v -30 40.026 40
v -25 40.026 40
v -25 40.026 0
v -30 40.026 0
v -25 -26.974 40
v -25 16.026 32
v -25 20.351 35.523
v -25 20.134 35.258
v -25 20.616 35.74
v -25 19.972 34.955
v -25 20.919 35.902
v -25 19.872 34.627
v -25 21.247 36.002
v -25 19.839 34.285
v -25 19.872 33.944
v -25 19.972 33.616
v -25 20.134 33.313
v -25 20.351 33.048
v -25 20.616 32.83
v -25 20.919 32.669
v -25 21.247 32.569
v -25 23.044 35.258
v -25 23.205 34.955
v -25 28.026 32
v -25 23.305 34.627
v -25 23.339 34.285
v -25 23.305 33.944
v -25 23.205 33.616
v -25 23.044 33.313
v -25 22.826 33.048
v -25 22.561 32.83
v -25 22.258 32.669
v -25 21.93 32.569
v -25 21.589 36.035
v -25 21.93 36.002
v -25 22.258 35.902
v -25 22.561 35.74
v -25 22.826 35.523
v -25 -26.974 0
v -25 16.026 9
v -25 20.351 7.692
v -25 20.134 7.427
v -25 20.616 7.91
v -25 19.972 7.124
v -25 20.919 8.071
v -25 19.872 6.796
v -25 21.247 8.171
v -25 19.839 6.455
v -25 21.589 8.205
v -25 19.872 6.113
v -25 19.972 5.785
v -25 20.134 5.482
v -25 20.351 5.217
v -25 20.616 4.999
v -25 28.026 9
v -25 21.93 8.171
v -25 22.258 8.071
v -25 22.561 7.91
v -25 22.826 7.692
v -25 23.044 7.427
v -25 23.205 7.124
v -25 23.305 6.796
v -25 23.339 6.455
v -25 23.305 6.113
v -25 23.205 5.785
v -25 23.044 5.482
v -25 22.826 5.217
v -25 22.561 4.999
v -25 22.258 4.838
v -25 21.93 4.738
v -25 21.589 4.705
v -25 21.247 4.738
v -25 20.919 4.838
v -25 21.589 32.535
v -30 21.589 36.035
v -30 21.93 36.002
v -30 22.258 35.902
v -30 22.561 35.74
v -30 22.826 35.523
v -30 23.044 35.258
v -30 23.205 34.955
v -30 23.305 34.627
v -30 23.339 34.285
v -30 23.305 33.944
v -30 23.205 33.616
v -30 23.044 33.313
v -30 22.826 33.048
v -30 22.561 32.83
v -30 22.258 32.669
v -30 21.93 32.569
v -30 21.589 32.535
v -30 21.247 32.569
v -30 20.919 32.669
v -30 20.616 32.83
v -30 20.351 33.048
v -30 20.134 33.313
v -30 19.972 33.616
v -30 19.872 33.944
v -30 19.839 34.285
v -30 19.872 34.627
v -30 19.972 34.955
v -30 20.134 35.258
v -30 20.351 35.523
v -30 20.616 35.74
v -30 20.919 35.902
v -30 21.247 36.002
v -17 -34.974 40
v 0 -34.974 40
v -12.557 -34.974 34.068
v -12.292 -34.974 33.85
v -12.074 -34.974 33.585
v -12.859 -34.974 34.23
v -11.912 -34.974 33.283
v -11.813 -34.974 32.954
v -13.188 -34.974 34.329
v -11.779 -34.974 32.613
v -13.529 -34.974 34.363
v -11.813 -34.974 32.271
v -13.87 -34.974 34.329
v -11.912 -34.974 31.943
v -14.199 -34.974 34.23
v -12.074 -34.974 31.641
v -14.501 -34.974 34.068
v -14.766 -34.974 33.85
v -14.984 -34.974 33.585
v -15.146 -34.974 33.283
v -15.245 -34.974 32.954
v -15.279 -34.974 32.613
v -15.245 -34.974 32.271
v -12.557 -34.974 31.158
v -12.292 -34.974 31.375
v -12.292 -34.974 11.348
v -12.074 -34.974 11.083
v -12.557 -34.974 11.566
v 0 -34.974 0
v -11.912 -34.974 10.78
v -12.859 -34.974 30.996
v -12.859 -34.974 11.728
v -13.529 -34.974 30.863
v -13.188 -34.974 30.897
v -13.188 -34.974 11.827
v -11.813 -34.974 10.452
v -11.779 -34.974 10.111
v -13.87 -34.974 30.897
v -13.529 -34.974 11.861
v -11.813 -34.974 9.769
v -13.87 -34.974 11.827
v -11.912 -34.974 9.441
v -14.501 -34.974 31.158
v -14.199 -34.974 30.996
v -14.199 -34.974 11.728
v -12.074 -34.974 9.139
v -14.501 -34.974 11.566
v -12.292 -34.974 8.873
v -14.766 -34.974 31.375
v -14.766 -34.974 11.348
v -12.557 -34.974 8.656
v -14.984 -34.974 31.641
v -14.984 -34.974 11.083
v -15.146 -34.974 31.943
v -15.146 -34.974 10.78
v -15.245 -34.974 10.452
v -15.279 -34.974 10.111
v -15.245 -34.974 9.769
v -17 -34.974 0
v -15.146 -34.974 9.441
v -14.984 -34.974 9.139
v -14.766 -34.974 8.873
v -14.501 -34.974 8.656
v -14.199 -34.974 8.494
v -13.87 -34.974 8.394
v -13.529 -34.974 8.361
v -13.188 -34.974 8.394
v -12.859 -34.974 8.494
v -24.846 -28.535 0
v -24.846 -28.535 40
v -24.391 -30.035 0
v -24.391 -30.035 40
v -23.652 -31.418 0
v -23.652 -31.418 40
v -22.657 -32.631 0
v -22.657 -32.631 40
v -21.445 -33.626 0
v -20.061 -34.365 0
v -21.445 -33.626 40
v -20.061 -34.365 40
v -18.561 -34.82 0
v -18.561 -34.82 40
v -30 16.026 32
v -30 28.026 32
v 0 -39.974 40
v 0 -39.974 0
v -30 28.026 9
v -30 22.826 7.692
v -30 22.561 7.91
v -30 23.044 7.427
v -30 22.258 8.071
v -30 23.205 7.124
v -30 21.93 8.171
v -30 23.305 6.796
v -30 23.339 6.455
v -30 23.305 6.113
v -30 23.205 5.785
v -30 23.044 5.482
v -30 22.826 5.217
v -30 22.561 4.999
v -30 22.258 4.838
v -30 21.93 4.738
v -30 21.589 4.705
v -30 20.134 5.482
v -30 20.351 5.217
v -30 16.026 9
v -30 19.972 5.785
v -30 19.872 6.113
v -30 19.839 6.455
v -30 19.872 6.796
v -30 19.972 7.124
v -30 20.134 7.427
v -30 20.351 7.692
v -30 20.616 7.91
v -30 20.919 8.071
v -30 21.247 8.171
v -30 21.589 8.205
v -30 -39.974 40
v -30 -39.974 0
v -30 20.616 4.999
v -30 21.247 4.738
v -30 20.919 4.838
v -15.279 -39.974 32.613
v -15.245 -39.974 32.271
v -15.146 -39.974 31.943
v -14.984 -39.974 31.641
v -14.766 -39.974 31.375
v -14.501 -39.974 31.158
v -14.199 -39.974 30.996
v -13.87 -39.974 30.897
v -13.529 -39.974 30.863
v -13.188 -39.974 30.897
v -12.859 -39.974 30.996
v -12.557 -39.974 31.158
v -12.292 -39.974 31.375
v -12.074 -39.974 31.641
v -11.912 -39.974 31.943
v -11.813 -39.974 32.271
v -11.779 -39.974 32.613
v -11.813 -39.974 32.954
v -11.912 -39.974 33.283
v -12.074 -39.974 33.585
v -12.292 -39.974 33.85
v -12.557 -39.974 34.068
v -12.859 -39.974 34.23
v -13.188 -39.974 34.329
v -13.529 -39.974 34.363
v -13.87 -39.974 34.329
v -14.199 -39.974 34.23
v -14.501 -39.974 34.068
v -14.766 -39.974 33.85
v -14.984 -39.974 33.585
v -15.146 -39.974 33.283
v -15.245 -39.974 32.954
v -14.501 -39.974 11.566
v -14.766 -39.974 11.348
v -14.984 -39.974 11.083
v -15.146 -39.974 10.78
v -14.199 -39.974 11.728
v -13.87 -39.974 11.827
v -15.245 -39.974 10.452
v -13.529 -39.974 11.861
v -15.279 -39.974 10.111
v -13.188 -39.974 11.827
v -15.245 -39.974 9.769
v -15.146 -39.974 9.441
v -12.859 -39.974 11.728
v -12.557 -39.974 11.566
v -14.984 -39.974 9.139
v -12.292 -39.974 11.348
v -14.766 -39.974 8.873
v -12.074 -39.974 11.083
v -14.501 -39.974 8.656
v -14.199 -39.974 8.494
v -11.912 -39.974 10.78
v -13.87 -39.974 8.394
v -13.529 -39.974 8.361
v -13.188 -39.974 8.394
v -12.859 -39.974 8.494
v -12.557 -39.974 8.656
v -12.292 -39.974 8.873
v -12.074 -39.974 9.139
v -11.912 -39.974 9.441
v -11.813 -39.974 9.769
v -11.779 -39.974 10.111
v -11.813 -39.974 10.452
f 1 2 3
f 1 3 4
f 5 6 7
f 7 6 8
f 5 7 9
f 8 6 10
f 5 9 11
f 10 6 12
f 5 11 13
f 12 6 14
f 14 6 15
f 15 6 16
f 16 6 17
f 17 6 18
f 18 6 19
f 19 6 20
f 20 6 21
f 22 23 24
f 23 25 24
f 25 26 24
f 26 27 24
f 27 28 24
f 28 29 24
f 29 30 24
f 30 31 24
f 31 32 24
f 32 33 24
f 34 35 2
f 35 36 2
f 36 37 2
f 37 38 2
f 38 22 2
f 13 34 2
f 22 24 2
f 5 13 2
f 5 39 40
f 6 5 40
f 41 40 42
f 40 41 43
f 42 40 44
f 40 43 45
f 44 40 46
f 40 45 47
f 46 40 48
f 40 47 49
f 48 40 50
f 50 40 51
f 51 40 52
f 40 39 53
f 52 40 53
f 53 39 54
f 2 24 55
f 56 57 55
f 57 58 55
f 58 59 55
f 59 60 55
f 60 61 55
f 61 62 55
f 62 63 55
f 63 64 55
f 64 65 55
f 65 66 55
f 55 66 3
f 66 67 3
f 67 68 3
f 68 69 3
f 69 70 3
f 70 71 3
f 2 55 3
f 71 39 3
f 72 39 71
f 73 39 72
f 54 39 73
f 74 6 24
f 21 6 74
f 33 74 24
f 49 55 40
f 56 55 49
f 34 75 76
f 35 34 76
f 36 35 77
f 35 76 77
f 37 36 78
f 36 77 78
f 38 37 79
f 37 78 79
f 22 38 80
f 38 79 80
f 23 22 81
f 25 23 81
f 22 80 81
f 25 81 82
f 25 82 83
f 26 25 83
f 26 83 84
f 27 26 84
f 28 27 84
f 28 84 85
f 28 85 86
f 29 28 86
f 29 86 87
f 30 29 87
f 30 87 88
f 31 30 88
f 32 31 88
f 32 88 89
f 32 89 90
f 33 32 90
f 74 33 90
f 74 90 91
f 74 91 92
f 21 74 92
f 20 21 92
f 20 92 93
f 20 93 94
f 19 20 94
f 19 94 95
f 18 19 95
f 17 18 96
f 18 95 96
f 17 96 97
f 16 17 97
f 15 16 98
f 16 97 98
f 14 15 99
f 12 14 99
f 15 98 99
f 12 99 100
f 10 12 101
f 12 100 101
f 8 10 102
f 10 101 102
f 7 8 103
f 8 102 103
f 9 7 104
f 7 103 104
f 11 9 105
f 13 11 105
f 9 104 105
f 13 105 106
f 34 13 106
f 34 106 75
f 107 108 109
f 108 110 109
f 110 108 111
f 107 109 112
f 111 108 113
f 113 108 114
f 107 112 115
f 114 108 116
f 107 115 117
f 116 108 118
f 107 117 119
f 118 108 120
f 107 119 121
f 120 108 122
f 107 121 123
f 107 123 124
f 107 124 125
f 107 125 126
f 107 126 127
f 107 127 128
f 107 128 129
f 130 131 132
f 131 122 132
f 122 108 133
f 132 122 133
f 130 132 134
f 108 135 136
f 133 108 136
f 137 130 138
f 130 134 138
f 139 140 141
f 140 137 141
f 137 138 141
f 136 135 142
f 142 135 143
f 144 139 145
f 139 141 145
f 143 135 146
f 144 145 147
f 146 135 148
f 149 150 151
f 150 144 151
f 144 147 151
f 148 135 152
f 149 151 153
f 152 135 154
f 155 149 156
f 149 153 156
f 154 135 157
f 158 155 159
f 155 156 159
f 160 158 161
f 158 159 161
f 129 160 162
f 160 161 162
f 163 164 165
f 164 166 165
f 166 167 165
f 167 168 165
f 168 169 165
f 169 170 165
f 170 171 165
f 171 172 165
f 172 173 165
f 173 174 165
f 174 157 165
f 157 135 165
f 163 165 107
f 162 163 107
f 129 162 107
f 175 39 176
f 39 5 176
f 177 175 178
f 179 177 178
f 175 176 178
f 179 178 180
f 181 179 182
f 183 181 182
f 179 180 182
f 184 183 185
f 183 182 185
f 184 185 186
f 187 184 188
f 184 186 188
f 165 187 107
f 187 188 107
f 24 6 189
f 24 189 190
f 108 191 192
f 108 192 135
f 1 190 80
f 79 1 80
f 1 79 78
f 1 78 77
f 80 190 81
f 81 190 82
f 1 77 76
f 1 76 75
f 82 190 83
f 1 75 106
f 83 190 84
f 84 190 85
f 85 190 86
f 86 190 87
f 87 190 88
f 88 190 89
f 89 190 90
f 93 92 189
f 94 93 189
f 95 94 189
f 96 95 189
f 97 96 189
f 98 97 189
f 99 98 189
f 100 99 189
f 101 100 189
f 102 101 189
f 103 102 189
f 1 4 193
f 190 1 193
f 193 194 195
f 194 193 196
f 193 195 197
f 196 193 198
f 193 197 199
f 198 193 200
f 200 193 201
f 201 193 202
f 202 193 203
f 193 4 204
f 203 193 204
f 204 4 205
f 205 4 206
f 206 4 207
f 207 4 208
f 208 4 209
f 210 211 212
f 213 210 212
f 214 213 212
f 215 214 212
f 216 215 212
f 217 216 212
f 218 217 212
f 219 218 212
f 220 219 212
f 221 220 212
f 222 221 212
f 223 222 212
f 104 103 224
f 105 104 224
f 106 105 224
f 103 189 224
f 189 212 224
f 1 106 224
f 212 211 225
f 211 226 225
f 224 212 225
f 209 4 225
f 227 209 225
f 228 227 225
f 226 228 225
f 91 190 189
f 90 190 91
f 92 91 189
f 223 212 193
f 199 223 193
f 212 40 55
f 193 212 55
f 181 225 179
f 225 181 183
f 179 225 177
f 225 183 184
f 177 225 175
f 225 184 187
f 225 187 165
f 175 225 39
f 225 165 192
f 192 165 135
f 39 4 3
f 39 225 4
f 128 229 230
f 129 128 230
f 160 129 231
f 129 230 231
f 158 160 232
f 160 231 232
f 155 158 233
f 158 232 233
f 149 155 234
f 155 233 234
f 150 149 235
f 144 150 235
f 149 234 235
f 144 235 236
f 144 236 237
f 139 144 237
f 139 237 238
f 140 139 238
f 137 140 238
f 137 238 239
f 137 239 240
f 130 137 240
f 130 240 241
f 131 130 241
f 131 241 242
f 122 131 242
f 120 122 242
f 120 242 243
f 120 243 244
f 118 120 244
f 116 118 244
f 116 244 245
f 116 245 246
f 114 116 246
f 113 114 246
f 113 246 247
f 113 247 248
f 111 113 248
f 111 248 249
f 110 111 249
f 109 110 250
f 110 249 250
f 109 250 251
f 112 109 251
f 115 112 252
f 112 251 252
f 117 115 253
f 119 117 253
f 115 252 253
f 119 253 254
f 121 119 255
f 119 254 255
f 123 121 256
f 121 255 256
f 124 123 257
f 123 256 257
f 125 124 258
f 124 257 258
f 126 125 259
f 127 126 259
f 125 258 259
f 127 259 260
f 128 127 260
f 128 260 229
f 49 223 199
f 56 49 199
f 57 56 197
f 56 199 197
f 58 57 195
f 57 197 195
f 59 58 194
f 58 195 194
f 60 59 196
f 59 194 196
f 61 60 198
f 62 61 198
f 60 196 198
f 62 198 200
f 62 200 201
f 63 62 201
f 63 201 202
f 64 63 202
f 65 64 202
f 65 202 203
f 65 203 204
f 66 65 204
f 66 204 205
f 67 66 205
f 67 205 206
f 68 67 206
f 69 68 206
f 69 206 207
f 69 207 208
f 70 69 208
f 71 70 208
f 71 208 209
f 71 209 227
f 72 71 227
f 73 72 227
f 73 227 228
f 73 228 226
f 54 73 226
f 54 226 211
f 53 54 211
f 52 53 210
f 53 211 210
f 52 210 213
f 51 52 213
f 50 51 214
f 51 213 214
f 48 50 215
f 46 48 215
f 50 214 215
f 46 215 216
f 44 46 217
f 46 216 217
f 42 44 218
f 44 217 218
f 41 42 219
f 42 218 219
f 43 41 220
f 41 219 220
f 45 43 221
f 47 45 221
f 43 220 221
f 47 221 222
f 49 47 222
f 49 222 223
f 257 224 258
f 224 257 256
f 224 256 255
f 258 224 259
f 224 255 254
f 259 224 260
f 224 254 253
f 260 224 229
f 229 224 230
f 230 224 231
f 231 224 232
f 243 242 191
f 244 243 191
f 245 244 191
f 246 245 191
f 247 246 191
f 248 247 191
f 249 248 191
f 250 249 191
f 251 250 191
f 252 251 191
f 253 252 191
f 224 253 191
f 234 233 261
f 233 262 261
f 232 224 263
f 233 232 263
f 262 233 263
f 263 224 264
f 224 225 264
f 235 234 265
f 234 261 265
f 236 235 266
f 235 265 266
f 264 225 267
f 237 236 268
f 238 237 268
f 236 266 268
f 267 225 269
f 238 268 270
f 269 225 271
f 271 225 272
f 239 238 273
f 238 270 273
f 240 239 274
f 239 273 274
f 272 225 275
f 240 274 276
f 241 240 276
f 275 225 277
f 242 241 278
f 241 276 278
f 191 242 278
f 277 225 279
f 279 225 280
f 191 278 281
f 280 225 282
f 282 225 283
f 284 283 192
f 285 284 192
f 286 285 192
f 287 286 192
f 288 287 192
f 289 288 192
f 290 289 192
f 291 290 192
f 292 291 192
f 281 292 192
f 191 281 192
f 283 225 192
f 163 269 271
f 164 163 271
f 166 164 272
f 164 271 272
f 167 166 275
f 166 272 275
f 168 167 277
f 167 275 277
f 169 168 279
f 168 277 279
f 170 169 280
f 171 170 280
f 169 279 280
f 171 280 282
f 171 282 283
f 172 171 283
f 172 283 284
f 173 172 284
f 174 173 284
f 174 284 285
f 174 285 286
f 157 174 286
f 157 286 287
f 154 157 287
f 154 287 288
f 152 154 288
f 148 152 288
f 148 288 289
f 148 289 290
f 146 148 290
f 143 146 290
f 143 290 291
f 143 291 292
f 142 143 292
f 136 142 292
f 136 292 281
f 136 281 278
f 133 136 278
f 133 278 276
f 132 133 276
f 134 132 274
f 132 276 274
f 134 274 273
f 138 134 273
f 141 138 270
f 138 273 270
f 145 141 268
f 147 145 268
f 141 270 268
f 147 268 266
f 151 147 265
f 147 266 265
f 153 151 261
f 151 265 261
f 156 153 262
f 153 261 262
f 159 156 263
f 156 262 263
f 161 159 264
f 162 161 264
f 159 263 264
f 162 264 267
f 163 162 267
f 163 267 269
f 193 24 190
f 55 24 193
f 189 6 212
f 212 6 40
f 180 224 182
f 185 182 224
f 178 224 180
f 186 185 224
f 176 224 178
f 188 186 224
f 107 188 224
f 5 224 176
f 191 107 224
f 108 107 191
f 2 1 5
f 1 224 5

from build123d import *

# Parameters (mm, degrees)
RESSALTO_EXTRUS_O1_DEPTH                   = 40
BROCA_DE_ROSQUEAR_PARA_HELICOIDE_M31_D     = 3.5
BROCA_DE_ROSQUEAR_PARA_HELICOIDE_M31_DEPTH = 10
BROCA_DE_ROSQUEAR_PARA_HELICOIDE_M31_TIP   = 1.051506083
FILETE1_R                                  = 8
ESBO_O6_W                                  = 23
ESBO_O6_H                                  = 12
CORTE_EXTRUS_O1_DEPTH                      = 10
BROCA_DE_ROSQUEAR_PARA_HELICOIDE_M33_D     = 3.5
BROCA_DE_ROSQUEAR_PARA_HELICOIDE_M33_DEPTH = 10
BROCA_DE_ROSQUEAR_PARA_HELICOIDE_M33_TIP   = 1.051506083


with BuildPart() as part:
    # Esboço1 → Ressalto-extrusão1 (new body)
    with BuildSketch(Plane.XY):
        Polygon((-30, 40.02617801), (-30, -39.97382199), (0, -39.97382199), (0, -34.97382199), (-25, -34.97382199), (-25, 40.02617801), align=None)
    extrude(amount=RESSALTO_EXTRUS_O1_DEPTH)

    # Broca de rosquear para helicoide M31
    with Locations(Plane(origin=(0, -34.97382199, 0), x_dir=(1, 0, 0), z_dir=(0, 1, 0))):
        with Locations((-13.529029312, -32.612904954), (-13.529029312, -10.11076891)):
            Hole(BROCA_DE_ROSQUEAR_PARA_HELICOIDE_M31_D / 2, depth=BROCA_DE_ROSQUEAR_PARA_HELICOIDE_M31_DEPTH)
            with Locations((0, 0, -(BROCA_DE_ROSQUEAR_PARA_HELICOIDE_M31_DEPTH + BROCA_DE_ROSQUEAR_PARA_HELICOIDE_M31_TIP / 2))):  # 118° drill point
                Cone(0, BROCA_DE_ROSQUEAR_PARA_HELICOIDE_M31_D / 2, BROCA_DE_ROSQUEAR_PARA_HELICOIDE_M31_TIP, mode=Mode.SUBTRACT)

    # Filete1
    filete1_edges = [part.edges().sort_by_distance(p)[0] for p in [
        (-25, -34.97382199, 20),
    ]]
    fillet(filete1_edges, radius=FILETE1_R)

    # Esboço6 → Corte-extrusão1 (cut)
    with BuildSketch(Plane(origin=(-25, 0, 0), x_dir=(0, 0, -1), z_dir=(1, 0, 0))):
        with Locations((-20.5, 22.02617801)):
            Rectangle(ESBO_O6_W, ESBO_O6_H)
    extrude(amount=-CORTE_EXTRUS_O1_DEPTH, mode=Mode.SUBTRACT)

    # Broca de rosquear para helicoide M33
    with Locations(Plane(origin=(-25, 0, 0), x_dir=(0, 0, -1), z_dir=(1, 0, 0))):
        with Locations((-6.454548455, 21.588594031), (-34.28528994, 21.588594031)):
            Hole(BROCA_DE_ROSQUEAR_PARA_HELICOIDE_M33_D / 2, depth=BROCA_DE_ROSQUEAR_PARA_HELICOIDE_M33_DEPTH)
            with Locations((0, 0, -(BROCA_DE_ROSQUEAR_PARA_HELICOIDE_M33_DEPTH + BROCA_DE_ROSQUEAR_PARA_HELICOIDE_M33_TIP / 2))):  # 118° drill point
                Cone(0, BROCA_DE_ROSQUEAR_PARA_HELICOIDE_M33_D / 2, BROCA_DE_ROSQUEAR_PARA_HELICOIDE_M33_TIP, mode=Mode.SUBTRACT)


solid = part.part
